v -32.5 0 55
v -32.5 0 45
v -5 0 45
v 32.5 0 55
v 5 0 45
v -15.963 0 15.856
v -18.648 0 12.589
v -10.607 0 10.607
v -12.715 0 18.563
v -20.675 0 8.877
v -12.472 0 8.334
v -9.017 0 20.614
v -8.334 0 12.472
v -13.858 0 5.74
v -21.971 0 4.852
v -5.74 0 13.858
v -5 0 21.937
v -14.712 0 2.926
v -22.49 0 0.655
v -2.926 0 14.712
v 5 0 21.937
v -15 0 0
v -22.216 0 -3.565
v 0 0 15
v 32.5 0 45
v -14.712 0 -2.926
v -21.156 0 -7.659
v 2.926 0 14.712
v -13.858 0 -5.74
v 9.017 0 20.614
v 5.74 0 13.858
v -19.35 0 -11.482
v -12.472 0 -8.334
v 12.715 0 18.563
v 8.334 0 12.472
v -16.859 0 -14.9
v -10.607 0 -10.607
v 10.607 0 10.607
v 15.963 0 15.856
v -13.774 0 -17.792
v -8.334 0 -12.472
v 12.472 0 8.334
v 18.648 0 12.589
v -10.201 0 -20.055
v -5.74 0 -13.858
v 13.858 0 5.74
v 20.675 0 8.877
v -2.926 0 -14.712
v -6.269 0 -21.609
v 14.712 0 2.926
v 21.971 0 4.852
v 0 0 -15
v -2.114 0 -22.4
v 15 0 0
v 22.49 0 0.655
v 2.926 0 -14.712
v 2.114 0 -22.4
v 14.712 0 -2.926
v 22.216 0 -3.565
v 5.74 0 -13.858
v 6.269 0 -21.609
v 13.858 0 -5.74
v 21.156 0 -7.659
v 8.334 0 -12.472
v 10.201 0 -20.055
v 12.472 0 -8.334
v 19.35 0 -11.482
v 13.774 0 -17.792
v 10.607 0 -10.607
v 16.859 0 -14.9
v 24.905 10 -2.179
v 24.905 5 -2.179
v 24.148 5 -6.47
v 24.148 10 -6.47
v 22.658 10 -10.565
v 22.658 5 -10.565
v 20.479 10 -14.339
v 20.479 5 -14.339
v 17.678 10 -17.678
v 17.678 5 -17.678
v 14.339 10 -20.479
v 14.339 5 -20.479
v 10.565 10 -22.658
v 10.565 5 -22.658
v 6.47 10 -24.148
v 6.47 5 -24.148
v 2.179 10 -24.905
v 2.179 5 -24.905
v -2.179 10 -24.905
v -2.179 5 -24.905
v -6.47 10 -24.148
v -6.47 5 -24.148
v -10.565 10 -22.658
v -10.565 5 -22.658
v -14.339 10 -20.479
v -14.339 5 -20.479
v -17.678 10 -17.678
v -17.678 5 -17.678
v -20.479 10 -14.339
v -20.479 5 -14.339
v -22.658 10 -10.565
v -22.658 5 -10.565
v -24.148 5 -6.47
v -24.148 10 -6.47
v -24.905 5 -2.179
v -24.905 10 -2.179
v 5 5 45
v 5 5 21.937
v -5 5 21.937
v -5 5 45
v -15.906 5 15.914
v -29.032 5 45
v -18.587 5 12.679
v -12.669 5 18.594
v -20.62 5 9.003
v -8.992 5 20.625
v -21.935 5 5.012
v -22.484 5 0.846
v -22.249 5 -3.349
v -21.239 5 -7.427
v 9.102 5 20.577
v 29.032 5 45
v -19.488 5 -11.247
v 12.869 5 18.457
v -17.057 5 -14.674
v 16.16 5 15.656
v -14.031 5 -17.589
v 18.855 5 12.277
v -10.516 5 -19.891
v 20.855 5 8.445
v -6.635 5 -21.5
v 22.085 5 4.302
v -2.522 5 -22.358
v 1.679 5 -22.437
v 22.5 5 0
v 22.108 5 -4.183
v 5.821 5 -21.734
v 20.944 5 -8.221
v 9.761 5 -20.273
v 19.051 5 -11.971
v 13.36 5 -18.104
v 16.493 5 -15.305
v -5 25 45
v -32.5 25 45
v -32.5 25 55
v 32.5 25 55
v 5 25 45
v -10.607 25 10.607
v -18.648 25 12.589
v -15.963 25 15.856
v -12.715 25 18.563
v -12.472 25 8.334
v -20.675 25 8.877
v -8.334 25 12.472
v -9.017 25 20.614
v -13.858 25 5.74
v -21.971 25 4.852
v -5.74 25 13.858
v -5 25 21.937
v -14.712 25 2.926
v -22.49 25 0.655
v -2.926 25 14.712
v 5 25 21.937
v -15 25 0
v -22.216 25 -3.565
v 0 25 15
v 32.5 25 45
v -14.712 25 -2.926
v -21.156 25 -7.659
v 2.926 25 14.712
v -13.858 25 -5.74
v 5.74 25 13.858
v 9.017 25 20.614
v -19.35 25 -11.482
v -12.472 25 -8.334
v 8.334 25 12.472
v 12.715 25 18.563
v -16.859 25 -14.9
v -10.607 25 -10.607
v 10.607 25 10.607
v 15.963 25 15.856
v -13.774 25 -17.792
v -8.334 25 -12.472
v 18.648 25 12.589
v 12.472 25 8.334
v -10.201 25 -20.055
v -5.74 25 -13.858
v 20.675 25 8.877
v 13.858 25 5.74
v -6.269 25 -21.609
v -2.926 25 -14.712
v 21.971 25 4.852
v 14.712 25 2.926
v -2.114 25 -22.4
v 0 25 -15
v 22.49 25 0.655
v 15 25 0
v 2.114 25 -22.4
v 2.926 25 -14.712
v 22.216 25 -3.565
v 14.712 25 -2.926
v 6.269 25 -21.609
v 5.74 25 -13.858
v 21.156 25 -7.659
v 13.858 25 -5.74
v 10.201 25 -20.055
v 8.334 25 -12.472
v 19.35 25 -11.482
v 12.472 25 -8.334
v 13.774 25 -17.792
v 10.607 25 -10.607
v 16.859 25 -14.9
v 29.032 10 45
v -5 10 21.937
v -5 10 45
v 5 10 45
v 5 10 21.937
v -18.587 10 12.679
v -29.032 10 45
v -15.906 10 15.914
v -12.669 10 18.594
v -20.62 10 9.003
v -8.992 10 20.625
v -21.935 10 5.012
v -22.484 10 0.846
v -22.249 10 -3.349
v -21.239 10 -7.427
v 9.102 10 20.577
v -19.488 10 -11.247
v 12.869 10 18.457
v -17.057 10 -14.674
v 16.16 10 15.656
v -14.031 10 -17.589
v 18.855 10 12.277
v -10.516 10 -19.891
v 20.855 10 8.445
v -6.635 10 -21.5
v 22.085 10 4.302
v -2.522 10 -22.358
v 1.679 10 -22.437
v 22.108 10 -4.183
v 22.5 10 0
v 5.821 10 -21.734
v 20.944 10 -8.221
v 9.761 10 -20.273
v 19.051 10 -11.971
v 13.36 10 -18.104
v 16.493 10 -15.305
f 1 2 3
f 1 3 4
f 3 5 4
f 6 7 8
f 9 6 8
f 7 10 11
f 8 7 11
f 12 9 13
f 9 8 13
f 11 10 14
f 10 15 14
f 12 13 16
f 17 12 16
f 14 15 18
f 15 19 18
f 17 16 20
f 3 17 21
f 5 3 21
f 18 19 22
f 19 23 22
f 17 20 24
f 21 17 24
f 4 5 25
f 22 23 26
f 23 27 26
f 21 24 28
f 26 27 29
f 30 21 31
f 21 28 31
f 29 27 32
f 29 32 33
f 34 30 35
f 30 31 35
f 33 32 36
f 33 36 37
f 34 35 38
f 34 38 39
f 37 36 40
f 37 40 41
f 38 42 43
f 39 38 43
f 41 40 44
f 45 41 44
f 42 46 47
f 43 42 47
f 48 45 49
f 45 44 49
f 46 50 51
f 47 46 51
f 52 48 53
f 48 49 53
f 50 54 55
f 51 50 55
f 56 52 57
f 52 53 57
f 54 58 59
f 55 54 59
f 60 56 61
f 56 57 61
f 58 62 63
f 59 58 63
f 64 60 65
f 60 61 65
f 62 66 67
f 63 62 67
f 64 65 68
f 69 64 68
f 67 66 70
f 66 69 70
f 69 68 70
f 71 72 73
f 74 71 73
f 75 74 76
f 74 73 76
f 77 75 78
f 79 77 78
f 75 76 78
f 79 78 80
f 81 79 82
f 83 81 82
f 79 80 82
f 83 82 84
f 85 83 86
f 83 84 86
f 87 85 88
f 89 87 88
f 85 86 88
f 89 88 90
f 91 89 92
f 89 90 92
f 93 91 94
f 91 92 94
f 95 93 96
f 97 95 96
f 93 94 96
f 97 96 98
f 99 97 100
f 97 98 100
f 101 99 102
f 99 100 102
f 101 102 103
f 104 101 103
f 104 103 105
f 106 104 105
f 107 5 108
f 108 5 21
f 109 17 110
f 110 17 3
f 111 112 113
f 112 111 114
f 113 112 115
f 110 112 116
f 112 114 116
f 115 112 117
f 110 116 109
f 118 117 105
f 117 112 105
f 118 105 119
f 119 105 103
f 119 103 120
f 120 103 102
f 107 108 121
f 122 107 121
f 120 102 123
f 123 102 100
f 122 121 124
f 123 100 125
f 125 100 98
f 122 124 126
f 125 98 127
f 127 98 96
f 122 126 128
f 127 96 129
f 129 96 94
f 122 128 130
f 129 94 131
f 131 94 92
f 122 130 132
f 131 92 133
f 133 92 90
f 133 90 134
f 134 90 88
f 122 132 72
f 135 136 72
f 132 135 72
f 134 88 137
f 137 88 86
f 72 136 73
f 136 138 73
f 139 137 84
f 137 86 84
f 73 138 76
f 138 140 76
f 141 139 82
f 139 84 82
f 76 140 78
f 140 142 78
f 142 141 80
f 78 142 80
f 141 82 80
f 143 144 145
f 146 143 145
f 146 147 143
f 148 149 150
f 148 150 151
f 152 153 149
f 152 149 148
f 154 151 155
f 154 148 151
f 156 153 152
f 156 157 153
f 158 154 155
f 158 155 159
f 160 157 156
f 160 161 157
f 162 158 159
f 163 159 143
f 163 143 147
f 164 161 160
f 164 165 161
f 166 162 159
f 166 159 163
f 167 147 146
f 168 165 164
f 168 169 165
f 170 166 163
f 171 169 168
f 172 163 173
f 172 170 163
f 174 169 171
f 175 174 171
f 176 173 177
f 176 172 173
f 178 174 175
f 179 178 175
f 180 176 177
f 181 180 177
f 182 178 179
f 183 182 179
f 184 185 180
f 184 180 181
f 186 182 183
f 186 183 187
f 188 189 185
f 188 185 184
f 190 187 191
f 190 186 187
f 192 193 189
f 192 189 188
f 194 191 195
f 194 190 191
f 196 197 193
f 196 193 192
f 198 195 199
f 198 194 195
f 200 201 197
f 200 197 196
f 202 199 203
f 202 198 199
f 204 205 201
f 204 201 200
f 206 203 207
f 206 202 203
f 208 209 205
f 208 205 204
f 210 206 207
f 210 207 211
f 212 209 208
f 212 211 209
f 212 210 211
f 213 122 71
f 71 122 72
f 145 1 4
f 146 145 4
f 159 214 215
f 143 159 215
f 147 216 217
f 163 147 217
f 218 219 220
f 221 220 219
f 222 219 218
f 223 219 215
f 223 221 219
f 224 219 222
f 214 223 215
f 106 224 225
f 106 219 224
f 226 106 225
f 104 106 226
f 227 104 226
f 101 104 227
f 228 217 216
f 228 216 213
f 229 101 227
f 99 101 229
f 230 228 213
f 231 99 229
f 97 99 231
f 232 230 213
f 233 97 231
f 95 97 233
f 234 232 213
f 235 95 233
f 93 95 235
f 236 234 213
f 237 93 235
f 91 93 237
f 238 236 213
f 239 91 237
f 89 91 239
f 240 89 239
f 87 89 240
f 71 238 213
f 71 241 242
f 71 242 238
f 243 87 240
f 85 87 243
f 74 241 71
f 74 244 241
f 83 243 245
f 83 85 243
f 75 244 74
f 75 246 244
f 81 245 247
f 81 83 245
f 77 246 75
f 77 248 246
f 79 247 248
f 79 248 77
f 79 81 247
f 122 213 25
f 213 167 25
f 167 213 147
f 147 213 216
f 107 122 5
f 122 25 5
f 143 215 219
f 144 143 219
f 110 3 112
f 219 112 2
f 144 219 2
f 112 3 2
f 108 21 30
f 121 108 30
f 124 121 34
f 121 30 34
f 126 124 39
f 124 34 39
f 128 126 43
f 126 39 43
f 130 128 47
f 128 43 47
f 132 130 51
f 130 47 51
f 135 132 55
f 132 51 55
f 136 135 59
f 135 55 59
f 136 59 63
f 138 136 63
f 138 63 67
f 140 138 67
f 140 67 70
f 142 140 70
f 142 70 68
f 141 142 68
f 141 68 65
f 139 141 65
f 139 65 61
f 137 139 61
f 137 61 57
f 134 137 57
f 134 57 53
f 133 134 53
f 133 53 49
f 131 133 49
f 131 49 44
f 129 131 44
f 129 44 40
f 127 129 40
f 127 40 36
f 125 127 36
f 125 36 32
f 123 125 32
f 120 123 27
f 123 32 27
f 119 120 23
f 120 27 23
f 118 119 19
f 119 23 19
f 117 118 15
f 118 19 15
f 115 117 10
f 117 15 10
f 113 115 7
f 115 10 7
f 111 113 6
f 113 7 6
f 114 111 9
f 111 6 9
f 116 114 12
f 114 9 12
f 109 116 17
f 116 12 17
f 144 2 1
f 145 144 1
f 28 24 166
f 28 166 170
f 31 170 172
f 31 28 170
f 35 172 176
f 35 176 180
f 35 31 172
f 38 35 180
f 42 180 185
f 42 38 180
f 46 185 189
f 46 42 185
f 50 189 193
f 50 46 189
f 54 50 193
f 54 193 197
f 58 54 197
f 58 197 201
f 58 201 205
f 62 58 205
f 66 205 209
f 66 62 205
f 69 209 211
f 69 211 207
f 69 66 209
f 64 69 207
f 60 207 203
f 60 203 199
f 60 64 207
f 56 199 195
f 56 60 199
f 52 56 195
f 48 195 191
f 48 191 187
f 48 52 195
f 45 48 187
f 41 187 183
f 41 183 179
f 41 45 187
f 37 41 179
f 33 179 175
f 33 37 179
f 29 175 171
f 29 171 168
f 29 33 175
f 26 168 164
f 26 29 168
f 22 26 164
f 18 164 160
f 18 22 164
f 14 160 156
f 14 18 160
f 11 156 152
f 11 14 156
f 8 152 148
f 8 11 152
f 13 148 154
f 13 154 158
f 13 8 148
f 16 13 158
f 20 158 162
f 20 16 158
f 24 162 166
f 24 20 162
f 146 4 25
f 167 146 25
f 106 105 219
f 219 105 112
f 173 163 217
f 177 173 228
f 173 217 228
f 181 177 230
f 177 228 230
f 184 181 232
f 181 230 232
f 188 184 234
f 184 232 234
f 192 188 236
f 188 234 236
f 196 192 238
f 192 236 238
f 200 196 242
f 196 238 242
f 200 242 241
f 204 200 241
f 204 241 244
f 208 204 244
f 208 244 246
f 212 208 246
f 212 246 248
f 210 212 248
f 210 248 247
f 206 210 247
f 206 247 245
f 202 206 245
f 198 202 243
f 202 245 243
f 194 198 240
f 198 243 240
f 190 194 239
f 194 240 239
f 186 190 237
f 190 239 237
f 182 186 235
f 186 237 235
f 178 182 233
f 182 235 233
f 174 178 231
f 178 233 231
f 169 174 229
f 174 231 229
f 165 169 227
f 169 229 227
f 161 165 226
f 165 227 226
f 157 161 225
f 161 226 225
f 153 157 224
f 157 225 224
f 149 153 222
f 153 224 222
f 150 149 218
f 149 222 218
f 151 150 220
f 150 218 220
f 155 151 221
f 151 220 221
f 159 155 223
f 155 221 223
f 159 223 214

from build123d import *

# Parameters (mm, degrees)
SKETCH1_R           = 15
BOSS_EXTRUDE1_DEPTH = 25
BOSS_EXTRUDE2_START = 5
BOSS_EXTRUDE2_DEPTH = 5


with BuildPart() as part:
    # Sketch1 → Boss-Extrude1 (new body)
    with BuildSketch(Plane(origin=(0, 0, 0), x_dir=(1, 0, 0), z_dir=(0, 1, 0))):
        with BuildLine():
            Line((-32.5, -45), (-32.5, -55))
            Line((-32.5, -55), (32.5, -55))
            Line((32.5, -55), (32.5, -45))
            Line((32.5, -45), (5, -45))
            Line((5, -45), (5, -21.937410968))
            ThreePointArc((5, -21.937410968), (0, 22.5), (-5, -21.937410968))
            Line((-5, -21.937410968), (-5, -45))
            Line((-5, -45), (-32.5, -45))
        make_face()
        with Locations(Location((0, 0, 0), (0, 0, 270))):
            Circle(SKETCH1_R, mode=Mode.SUBTRACT)
    extrude(amount=BOSS_EXTRUDE1_DEPTH)

    # Sketch1<3> → Boss-Extrude2 (add)
    with BuildSketch(Plane(origin=(0, 0, 0), x_dir=(1, 0, 0), z_dir=(0, 1, 0)).offset(BOSS_EXTRUDE2_START)):
        with BuildLine():
            ThreePointArc((24.904867452, 2.178893569), (0, 25), (-24.904867452, 2.178893569))
            Line((-24.904867452, 2.178893569), (-29.032485797, -45))
            Line((-29.032485797, -45), (-5, -45))
            Line((-5, -45), (-5, -24.494897428))
            Line((-5, -24.494897428), (-5, -21.937410968))
            ThreePointArc((-5, -21.937410968), (-14.0312152, 17.589059099), (22.5, 0))
            ThreePointArc((22.5, 0), (17.589059099, -14.0312152), (5, -21.937410968))
            Line((5, -21.937410968), (5, -24.494897428))
            Line((5, -24.494897428), (5, -45))
            Line((5, -45), (29.032485797, -45))
            Line((29.032485797, -45), (24.904867452, 2.178893569))
        make_face()
    extrude(amount=BOSS_EXTRUDE2_DEPTH)


solid = part.part
